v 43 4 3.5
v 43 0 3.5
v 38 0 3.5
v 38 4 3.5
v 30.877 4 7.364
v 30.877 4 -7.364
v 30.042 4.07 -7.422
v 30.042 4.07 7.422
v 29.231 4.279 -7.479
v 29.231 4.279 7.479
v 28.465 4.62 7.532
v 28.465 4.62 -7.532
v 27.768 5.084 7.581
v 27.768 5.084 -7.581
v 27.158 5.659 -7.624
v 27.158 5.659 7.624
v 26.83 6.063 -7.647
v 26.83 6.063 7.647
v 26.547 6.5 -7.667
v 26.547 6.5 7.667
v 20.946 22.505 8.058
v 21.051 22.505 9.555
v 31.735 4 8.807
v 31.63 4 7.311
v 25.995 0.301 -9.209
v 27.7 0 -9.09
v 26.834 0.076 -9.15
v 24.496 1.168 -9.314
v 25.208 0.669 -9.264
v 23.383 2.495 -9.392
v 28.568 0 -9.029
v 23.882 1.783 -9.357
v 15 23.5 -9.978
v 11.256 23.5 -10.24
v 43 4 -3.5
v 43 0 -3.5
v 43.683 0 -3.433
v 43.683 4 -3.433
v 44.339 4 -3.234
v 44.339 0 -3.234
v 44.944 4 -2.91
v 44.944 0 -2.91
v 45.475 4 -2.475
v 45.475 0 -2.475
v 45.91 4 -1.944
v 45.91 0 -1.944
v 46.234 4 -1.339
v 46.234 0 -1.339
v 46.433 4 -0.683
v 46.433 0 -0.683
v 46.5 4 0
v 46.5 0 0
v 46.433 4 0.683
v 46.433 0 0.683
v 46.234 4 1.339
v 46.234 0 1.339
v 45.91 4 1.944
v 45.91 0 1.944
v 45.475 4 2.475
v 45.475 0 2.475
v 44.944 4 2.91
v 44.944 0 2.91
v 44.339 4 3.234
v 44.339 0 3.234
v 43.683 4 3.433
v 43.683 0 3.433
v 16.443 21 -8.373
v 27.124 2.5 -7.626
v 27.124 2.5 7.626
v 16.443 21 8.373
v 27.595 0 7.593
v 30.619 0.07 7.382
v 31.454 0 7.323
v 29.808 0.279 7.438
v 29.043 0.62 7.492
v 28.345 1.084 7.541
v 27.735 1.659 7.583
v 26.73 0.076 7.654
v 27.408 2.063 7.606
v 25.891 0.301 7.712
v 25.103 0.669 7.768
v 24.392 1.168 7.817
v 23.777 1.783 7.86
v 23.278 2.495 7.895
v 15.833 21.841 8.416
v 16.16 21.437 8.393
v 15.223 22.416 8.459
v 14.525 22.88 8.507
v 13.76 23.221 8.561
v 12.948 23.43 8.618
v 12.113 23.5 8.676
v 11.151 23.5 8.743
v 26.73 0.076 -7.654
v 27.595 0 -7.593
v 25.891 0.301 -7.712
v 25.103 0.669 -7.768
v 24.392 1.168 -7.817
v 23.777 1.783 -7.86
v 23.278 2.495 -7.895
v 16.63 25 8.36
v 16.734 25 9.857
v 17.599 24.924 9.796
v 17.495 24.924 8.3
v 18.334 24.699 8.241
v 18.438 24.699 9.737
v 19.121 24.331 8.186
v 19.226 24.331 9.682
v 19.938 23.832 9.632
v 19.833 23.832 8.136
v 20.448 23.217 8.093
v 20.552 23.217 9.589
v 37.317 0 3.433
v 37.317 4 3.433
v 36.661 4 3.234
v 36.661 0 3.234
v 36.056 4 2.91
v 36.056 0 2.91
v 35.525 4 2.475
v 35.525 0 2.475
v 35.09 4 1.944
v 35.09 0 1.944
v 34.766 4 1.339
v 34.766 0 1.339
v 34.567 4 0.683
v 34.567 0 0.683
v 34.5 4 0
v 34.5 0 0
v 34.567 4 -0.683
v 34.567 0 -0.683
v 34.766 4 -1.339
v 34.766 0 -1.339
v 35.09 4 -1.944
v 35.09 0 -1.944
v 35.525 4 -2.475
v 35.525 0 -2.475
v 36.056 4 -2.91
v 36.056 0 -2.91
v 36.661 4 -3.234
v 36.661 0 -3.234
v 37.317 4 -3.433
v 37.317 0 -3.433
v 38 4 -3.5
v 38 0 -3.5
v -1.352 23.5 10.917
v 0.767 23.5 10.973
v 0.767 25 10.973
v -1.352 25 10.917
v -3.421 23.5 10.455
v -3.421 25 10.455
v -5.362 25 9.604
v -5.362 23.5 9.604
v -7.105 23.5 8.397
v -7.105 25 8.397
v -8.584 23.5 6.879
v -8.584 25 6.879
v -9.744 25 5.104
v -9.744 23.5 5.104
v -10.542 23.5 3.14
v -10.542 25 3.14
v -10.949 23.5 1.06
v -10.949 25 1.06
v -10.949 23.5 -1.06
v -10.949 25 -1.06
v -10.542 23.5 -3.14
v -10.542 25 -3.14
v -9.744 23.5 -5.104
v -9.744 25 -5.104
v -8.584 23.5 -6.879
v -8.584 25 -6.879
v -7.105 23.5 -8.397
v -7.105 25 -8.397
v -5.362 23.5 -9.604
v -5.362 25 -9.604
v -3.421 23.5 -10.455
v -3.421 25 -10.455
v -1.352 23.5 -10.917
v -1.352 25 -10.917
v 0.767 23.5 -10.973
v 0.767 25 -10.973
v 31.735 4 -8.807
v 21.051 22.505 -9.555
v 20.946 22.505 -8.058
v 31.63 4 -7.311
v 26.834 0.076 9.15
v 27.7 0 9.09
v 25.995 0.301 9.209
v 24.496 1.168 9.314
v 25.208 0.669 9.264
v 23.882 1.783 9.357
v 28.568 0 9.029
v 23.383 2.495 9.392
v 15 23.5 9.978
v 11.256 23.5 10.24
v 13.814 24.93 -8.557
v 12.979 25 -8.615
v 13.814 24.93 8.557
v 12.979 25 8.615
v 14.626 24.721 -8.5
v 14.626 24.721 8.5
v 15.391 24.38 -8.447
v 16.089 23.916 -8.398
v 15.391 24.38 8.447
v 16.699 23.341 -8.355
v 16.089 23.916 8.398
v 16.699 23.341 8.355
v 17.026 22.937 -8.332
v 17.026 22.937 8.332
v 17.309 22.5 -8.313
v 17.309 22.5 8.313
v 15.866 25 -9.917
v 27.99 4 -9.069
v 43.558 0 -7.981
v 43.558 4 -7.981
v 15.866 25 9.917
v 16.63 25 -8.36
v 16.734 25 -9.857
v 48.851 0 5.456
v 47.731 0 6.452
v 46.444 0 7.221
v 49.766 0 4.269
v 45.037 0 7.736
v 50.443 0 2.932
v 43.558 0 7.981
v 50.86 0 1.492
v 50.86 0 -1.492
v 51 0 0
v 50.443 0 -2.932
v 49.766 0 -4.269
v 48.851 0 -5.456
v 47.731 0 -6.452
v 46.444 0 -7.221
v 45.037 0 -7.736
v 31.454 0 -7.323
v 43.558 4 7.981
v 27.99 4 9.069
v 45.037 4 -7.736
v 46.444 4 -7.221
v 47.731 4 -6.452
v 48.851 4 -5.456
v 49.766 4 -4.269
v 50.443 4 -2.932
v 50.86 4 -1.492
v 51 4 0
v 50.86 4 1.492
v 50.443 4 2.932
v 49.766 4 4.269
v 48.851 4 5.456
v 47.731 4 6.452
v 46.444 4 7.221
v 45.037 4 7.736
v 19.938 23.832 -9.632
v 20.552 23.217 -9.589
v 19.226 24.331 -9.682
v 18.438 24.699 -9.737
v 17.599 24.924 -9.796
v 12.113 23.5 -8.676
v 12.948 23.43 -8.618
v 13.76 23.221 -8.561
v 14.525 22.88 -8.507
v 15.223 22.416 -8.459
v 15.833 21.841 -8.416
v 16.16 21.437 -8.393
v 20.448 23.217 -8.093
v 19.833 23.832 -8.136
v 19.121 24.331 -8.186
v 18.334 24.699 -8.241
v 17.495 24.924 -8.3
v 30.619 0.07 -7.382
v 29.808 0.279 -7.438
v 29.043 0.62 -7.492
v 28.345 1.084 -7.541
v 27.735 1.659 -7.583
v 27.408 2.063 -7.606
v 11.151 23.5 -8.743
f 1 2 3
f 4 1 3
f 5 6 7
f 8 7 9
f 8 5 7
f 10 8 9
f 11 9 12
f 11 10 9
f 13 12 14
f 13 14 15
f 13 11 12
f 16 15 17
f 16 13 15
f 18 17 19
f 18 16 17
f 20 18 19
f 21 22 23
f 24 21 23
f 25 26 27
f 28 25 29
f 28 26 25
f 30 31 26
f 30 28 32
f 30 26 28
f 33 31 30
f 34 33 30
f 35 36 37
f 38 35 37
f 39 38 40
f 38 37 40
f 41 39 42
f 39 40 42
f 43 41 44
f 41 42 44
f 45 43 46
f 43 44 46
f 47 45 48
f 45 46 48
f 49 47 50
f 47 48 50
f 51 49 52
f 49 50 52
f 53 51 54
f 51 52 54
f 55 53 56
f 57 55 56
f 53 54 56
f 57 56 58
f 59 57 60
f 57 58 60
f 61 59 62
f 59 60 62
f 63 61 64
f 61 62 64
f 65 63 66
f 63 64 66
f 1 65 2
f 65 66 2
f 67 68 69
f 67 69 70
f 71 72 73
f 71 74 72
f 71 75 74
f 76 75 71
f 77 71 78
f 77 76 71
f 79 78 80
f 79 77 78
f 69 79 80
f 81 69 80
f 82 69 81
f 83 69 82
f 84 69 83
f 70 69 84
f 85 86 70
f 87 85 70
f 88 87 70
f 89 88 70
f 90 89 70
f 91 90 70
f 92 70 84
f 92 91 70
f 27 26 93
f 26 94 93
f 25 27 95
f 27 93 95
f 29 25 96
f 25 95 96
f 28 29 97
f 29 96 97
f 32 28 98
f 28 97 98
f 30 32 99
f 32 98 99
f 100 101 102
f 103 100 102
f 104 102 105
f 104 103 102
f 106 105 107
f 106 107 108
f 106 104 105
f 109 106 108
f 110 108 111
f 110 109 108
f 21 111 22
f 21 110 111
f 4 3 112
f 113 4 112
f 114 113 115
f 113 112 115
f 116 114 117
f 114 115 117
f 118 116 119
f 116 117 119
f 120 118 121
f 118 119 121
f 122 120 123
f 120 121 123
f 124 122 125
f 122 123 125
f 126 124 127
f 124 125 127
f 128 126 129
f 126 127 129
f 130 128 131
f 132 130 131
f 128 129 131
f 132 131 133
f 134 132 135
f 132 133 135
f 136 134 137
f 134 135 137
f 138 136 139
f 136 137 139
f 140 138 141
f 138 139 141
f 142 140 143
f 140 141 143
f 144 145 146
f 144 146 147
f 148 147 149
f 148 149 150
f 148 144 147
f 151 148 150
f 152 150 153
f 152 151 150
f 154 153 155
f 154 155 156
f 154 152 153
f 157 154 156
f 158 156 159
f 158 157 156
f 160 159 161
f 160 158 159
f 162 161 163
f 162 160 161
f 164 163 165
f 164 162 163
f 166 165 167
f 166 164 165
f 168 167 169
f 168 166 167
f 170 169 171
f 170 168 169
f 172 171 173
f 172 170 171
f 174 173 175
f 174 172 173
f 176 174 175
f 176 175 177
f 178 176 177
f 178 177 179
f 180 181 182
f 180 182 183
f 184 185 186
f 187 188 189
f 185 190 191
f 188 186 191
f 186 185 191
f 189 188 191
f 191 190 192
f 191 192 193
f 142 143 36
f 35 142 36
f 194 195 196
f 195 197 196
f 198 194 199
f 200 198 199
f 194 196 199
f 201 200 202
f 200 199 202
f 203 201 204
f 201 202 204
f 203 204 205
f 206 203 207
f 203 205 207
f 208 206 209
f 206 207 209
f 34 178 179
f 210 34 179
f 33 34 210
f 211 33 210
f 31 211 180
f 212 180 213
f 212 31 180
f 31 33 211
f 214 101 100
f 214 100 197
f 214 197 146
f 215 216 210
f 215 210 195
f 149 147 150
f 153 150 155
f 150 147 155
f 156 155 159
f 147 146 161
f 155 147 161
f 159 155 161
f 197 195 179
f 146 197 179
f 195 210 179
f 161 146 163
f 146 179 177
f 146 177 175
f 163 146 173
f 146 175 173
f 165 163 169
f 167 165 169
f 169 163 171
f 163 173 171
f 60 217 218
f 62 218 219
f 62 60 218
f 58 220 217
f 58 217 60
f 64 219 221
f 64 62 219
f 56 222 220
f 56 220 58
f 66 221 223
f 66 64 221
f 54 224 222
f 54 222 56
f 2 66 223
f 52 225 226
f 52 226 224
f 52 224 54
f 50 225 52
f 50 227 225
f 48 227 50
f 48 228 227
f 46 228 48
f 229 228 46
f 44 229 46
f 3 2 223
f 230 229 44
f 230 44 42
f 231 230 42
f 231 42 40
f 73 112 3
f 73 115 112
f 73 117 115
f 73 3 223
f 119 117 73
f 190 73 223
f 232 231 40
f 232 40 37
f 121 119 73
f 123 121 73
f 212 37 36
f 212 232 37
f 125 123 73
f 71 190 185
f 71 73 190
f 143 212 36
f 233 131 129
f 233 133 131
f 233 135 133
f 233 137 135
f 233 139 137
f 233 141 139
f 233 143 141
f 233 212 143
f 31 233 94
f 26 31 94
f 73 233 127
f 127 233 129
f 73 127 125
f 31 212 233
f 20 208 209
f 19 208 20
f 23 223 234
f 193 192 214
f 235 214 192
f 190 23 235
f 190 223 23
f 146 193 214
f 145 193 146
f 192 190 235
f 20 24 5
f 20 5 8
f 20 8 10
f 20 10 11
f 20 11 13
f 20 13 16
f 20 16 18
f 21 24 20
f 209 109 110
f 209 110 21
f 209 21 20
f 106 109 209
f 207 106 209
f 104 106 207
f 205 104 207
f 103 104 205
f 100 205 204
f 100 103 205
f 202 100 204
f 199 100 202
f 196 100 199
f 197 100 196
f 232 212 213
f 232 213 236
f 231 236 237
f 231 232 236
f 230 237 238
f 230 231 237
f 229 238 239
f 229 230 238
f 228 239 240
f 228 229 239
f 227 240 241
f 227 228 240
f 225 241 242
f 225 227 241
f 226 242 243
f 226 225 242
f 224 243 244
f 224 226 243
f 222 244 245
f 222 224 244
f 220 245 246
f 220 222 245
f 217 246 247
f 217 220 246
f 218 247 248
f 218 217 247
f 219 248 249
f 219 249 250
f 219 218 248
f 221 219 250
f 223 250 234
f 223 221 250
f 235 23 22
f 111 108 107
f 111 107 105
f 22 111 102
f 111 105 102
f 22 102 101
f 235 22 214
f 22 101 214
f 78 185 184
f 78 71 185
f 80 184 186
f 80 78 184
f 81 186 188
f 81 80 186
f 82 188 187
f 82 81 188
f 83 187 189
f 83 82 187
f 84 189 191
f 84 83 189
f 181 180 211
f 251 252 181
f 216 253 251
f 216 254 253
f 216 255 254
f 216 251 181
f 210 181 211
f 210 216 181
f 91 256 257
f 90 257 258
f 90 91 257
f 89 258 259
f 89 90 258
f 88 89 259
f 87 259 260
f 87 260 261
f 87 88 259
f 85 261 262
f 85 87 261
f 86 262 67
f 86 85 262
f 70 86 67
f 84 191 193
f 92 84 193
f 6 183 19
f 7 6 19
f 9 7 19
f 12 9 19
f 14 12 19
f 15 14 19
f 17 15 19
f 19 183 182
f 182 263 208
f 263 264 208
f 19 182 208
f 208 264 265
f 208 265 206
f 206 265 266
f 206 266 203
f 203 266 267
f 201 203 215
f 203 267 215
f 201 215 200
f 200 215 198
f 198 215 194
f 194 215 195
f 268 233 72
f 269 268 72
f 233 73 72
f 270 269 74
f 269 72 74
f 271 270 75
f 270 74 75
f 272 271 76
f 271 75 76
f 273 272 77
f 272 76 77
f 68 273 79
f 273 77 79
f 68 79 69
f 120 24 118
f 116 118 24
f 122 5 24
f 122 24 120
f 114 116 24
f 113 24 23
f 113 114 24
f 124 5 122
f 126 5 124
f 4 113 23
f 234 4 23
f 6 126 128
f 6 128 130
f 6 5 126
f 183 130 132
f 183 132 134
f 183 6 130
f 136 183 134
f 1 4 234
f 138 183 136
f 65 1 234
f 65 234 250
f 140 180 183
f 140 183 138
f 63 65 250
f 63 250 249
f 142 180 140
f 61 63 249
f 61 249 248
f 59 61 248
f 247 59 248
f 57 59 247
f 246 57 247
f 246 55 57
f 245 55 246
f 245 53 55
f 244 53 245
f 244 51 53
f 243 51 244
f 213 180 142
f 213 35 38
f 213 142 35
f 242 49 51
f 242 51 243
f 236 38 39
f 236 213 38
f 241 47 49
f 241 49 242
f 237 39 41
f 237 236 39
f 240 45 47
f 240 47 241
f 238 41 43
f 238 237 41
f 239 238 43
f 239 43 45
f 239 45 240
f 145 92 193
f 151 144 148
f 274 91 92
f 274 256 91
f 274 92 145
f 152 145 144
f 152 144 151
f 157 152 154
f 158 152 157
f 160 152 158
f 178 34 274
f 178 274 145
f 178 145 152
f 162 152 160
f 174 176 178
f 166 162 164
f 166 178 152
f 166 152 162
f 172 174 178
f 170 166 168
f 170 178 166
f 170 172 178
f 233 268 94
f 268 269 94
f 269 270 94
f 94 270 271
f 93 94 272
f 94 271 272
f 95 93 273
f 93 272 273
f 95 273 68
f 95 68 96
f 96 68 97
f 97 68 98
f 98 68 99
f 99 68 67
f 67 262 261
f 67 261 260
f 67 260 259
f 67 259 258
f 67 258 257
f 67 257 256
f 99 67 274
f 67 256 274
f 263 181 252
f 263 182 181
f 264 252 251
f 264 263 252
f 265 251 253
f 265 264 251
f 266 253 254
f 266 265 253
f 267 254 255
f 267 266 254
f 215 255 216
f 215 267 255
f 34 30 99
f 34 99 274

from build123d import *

# Parameters (mm, degrees)
BOSS_EXTRU_1_DEPTH           = 25
ENL_V_MAT_EXTRU_2_DEPTH      = 58.853262656
ENL_V_MAT_EXTRU_2_DEPTH_BACK = 58.853262656
BOSS_EXTRU_2_DEPTH           = 1.5
CONG_1_R                     = 5


with BuildPart() as part:
    # Esquisse1 → Boss.-Extru.1 (new body)
    with BuildSketch(Plane(origin=(0, 0, 0), x_dir=(1, 0, 0), z_dir=(0, 1, 0))):
        with BuildLine():
            Line((0.76744186, 10.973196116), (43.558139535, 7.980506266))
            ThreePointArc((43.558139535, 7.980506266), (51, 0), (43.558139535, -7.980506266))
            Line((43.558139535, -7.980506266), (0.76744186, -10.973196116))
            ThreePointArc((0.76744186, -10.973196116), (-11, 0), (0.76744186, 10.973196116))
        make_face()
        with BuildLine():
            Line((43, -3.5), (38, -3.5))
            ThreePointArc((38, -3.5), (34.5, 0), (38, 3.5))
            Line((38, 3.5), (43, 3.5))
            ThreePointArc((43, 3.5), (46.5, 0), (43, -3.5))
        make_face(mode=Mode.SUBTRACT)
    extrude(amount=BOSS_EXTRU_1_DEPTH)

    # Esquisse4 → Enlèv. mat.-Extru.2 (cut, two sides: drawn at the far end of the back side and taken through both)
    with BuildSketch(Plane.XY.offset(-ENL_V_MAT_EXTRU_2_DEPTH_BACK)):
        Polygon((-11, 0), (28.567731326, 0), (15, 23.5), (-11, 23.5), align=None)
        Polygon((51, 25), (15.866025404, 25), (27.990381057, 4), (51, 4), align=None)
    extrude(amount=ENL_V_MAT_EXTRU_2_DEPTH + ENL_V_MAT_EXTRU_2_DEPTH_BACK, mode=Mode.SUBTRACT)

    # Esquisse6 → Boss.-Extru.2 (add)
    with BuildSketch(Plane(origin=(0.76744186, 0, 10.973196116), x_dir=(0.997563283233824, 0, -0.0697674418604651), z_dir=(0.0697674418604651, 0, 0.9975632832338241))):
        Polygon((9.645698279, 25), (18.888948853, 25), (33.357962471, 0), (24.114711897, 0), align=None)
    boss_extru_2 = extrude(amount=-BOSS_EXTRU_2_DEPTH)

    # Symétrie1: Boss.-Extru.2 across plane
    add(boss_extru_2.mirror(Plane.XY))

    # Congé1
    cong_1_edges = [part.edges().sort_by_distance(p)[0] for p in [
        (27.990381057, 4, 0),
        (15, 23.5, 0),
        (28.567731326, 0, 0),
        (15.866025404, 25, 0),
        (24.771067454, 0, -8.542601893),
        (19.558038113, 25, -8.907190012),
        (24.771067454, 0, 8.542601893),
        (19.558038113, 25, 8.907190012),
    ]]
    fillet(cong_1_edges, radius=CONG_1_R)


solid = part.part
